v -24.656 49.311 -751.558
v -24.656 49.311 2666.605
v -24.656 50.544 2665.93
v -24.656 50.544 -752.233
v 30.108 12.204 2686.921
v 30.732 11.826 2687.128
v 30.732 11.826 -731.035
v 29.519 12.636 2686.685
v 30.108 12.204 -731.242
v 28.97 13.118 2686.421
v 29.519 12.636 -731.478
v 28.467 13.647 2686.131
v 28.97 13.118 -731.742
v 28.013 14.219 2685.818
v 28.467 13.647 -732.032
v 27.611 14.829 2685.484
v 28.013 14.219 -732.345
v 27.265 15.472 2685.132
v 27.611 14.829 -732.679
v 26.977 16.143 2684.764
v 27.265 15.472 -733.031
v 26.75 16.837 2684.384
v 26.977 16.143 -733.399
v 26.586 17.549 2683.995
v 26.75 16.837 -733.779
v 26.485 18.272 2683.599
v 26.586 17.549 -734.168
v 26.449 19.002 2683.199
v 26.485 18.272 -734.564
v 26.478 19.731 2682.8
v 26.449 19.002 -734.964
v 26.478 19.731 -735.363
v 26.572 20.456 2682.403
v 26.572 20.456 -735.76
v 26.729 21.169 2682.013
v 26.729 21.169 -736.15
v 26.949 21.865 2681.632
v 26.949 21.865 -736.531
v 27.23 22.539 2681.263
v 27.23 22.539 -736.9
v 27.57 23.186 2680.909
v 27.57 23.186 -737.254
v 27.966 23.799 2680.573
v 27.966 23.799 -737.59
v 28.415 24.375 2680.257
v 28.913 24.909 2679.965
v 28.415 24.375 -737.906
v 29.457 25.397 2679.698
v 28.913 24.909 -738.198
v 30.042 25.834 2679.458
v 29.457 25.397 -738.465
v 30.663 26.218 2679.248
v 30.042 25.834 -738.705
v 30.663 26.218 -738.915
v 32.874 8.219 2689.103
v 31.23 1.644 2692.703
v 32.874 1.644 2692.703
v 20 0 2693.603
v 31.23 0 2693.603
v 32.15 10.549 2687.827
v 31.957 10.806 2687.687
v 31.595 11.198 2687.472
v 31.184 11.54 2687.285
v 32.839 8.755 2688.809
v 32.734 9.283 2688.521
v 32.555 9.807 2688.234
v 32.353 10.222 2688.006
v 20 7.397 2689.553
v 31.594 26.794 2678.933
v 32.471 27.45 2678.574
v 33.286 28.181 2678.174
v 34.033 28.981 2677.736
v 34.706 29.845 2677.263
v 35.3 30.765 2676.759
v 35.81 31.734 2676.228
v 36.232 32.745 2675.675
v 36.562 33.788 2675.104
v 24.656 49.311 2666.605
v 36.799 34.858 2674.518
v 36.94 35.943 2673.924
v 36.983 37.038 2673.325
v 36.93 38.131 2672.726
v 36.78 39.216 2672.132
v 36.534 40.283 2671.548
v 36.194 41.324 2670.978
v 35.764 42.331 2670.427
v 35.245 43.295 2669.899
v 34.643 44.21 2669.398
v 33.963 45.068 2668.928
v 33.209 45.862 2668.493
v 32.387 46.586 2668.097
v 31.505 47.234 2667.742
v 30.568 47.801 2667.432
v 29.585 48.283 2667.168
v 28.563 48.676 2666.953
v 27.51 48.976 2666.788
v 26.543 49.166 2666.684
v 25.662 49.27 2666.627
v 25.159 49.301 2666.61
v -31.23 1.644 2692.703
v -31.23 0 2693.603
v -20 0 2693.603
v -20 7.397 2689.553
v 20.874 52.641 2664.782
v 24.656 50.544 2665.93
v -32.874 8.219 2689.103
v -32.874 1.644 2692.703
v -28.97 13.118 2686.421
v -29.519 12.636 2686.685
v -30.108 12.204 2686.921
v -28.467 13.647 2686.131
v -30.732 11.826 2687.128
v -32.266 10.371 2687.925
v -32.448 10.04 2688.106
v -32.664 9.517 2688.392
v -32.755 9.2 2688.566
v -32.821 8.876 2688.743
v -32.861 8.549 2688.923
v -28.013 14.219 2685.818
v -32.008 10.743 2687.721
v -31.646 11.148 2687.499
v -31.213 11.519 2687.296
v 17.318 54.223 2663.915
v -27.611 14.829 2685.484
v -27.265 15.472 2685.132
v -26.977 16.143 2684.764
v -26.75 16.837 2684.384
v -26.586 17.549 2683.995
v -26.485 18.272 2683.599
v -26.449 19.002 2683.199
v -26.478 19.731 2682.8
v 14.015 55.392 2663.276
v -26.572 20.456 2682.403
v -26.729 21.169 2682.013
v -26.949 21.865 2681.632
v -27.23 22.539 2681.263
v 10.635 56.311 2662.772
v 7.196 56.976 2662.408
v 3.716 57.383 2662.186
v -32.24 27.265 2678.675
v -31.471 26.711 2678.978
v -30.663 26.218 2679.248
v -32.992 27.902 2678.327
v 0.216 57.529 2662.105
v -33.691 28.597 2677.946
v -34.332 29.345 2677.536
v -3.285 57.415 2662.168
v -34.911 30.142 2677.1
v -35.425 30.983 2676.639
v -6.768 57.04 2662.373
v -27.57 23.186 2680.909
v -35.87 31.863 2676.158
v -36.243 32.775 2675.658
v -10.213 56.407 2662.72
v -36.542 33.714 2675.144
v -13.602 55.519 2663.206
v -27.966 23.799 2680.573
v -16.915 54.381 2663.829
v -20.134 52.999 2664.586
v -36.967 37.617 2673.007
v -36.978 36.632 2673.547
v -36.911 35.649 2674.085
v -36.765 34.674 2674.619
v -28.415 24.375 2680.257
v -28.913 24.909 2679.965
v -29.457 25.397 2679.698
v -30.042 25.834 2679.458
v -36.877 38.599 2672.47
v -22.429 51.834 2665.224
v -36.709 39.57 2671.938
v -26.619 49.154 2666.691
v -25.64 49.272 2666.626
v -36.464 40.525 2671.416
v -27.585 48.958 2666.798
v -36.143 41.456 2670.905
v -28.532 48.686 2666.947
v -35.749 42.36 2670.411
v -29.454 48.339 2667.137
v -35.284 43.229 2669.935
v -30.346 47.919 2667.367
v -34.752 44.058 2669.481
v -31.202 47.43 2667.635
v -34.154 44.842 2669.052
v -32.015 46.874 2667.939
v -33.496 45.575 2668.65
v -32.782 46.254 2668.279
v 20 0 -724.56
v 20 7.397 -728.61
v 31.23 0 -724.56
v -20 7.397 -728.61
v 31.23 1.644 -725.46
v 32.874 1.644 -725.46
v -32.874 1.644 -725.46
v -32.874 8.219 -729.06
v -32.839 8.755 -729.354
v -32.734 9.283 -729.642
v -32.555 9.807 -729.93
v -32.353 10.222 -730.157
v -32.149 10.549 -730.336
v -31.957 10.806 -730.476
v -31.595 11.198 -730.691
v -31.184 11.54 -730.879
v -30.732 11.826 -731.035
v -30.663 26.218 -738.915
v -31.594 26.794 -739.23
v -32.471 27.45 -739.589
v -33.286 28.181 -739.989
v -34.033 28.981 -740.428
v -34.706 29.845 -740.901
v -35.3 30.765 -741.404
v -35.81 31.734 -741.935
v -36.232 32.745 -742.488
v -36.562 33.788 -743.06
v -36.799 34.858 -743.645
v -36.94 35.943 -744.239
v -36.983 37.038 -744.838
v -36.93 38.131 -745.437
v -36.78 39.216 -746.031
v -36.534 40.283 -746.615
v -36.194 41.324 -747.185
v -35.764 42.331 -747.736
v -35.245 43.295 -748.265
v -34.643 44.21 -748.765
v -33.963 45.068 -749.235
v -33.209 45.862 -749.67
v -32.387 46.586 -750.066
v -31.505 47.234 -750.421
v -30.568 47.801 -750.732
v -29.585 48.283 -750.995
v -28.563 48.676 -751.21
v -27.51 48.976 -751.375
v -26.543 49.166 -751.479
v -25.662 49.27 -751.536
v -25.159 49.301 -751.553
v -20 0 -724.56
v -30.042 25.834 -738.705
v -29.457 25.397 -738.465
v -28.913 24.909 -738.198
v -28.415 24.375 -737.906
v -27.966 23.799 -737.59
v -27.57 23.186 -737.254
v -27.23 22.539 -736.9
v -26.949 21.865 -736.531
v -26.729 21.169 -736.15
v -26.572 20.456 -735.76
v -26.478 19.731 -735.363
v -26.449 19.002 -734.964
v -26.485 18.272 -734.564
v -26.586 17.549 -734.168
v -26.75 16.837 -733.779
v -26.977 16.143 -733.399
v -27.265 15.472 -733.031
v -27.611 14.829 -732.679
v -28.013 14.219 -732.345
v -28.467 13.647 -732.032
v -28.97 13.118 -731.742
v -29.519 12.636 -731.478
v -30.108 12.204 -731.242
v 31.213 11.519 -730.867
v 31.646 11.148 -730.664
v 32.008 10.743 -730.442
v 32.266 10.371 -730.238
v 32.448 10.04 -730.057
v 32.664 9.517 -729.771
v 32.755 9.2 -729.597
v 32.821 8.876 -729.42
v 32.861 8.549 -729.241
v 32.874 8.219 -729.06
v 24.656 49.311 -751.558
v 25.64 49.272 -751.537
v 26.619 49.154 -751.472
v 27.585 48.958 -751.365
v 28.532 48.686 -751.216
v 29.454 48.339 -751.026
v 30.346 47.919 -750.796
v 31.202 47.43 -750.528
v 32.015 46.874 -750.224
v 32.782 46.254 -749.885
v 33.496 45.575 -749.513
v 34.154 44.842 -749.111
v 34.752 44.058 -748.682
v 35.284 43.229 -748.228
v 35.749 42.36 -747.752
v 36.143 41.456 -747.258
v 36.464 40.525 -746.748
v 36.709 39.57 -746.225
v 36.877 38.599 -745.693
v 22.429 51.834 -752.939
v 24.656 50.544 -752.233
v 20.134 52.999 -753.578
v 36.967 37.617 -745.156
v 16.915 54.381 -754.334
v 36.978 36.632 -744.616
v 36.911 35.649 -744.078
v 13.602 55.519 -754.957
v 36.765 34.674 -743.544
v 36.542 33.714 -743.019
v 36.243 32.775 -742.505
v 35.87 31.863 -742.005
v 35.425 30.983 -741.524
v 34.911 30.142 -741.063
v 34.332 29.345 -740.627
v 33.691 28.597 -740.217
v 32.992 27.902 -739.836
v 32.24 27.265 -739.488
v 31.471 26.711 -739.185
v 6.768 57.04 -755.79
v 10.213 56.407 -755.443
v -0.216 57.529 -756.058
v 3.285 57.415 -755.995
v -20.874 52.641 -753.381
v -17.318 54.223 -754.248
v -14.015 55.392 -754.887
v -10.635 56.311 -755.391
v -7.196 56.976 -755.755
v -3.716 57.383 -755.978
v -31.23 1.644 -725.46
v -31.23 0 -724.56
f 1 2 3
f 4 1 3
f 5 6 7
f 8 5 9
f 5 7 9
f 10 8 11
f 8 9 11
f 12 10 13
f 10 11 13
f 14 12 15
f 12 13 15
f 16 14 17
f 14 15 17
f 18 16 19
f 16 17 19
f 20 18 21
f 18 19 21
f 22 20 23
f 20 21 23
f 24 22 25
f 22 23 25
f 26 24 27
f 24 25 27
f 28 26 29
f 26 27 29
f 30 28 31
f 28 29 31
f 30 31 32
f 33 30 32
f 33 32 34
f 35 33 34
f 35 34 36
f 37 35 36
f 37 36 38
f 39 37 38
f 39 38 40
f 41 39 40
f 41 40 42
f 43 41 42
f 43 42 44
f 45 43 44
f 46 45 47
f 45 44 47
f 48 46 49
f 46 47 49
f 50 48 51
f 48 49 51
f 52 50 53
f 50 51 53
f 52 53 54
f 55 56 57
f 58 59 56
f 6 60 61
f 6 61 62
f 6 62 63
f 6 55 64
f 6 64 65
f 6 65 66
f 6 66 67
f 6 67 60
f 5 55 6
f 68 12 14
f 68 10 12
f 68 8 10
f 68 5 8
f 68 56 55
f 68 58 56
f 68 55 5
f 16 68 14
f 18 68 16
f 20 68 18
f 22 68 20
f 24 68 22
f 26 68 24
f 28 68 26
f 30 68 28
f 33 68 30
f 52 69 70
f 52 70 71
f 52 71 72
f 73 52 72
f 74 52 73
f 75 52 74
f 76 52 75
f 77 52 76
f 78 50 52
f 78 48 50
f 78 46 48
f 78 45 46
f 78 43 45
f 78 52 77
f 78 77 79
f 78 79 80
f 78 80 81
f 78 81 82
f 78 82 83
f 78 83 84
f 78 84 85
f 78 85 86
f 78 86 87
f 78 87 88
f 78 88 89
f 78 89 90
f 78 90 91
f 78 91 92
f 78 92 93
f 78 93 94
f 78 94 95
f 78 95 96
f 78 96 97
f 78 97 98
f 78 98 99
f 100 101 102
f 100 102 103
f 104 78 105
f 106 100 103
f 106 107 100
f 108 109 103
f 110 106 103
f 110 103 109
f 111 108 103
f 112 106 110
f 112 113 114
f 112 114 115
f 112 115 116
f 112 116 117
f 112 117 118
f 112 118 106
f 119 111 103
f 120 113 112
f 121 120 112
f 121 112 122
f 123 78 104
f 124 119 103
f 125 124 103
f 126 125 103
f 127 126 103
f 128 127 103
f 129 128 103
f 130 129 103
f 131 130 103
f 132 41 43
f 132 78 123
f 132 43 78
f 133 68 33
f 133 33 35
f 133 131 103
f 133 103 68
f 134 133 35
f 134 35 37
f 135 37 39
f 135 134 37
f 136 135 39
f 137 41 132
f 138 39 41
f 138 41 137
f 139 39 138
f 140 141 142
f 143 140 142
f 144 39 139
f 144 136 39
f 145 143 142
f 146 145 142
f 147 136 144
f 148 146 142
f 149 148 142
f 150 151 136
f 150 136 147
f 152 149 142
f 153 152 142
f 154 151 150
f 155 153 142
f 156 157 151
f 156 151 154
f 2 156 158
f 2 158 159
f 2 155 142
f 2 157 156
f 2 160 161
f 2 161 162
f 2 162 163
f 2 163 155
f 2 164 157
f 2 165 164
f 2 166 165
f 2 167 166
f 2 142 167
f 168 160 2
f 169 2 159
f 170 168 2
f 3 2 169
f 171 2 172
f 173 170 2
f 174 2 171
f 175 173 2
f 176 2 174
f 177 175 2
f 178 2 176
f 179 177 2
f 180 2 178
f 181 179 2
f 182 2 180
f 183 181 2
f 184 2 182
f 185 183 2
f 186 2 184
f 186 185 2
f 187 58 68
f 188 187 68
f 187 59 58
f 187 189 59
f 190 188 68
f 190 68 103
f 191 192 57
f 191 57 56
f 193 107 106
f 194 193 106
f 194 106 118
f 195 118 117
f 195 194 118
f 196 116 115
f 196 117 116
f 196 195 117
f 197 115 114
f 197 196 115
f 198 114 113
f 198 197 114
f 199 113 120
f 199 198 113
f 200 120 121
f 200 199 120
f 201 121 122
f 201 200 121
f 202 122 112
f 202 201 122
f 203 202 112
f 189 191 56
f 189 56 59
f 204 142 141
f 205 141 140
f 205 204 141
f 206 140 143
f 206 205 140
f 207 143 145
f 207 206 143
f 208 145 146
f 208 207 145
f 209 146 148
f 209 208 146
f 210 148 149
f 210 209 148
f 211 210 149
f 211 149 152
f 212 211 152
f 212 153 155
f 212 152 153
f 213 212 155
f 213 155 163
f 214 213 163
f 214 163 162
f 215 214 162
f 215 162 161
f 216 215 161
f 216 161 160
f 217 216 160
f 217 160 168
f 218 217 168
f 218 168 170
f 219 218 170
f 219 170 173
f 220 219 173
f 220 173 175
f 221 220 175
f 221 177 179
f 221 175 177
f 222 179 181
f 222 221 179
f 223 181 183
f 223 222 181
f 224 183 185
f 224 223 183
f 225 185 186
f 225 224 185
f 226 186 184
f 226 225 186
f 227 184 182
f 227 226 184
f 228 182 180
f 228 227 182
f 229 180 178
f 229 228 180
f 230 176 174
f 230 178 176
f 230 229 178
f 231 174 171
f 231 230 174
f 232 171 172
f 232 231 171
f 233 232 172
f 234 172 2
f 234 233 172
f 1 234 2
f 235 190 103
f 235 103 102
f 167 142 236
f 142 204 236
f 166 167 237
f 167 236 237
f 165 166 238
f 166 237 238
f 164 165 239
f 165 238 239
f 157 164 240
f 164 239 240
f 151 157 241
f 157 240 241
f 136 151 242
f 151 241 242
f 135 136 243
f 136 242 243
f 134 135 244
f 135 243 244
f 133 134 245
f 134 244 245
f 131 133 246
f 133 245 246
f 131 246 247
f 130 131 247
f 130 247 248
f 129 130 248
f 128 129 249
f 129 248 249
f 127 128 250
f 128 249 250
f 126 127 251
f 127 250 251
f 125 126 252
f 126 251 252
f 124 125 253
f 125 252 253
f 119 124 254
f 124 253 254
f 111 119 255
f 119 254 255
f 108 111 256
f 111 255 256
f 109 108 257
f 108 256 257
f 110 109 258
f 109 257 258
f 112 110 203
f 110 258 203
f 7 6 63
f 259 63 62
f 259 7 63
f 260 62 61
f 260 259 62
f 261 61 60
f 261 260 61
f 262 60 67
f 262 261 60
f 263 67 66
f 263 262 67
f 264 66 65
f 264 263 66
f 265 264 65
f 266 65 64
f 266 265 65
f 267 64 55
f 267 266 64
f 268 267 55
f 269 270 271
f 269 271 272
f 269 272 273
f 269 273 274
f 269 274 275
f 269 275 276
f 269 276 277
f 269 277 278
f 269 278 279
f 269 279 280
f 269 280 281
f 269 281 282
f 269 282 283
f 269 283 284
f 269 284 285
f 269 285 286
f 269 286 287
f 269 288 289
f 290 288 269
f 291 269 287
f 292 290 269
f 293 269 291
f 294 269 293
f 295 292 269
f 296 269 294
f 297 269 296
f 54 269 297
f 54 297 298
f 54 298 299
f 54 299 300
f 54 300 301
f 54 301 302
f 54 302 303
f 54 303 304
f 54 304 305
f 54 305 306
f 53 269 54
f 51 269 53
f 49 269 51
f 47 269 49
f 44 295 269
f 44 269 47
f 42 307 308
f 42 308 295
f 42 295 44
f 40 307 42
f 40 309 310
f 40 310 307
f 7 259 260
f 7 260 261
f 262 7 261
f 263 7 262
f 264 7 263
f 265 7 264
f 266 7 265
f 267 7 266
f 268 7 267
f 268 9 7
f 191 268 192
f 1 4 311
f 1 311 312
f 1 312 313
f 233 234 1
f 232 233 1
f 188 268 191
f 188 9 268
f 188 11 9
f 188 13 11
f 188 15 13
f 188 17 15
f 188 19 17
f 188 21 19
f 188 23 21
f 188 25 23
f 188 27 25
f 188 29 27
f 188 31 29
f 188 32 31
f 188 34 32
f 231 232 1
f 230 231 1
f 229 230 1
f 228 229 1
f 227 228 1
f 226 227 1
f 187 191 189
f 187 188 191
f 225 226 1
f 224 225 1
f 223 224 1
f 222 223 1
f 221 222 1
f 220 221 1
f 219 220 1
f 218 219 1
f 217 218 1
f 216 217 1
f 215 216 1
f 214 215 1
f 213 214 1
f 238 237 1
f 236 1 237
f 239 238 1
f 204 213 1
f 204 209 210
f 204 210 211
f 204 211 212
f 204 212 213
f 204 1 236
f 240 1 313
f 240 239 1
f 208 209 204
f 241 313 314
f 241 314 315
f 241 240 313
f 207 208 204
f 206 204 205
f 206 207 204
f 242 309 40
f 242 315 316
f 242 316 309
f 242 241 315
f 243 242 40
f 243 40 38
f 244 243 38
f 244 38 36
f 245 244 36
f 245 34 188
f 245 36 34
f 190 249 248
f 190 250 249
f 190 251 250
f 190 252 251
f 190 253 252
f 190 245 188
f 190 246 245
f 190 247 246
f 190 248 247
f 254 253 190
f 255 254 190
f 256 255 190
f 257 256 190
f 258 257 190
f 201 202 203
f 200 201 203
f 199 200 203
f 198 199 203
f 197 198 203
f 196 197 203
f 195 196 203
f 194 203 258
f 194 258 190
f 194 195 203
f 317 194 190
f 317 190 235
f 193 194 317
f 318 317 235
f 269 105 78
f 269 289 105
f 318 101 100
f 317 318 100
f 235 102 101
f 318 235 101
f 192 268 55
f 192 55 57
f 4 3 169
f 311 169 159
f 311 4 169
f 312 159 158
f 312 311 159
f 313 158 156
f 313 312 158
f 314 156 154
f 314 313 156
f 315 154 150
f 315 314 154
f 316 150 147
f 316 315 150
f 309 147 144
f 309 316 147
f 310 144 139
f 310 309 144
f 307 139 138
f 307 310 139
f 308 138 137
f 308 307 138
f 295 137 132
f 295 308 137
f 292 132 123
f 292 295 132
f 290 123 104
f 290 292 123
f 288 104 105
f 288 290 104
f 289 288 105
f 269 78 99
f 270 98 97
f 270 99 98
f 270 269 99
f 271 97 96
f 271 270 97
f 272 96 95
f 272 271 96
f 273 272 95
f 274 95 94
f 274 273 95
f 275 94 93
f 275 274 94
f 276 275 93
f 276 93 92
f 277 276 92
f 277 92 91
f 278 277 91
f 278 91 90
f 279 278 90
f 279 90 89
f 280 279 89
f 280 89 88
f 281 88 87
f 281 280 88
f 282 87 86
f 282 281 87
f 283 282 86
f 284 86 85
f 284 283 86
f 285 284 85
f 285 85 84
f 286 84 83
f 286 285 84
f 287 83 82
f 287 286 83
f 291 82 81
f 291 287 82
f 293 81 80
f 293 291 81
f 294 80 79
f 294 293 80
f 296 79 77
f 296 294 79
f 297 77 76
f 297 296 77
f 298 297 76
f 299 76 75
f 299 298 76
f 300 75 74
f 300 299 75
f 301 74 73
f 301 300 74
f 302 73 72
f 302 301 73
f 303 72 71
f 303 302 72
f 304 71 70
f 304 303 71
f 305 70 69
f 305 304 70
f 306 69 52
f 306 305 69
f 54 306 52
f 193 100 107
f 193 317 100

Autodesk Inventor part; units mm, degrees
sketch "Поручень" plane through (0, 0, 0) normal (0, 0, 1) x (1, 0, 0)
  line L0 (20.3655, -7.6059) -> (20.3655, -0.2092)
  line L1 (20.3655, -0.2092) -> (-19.6345, -0.2092)
  line L2 (-19.6345, -0.2092) -> (-19.6345, -7.6059)
  line L3 (-19.6345, -7.6059) -> (-30.865, -7.6059)
  line L4 (-30.865, -7.6059) -> (-30.865, -5.9622)
  line L5 (-30.865, -5.9622) -> (-32.5087, -5.9622)
  line L6 (-32.5087, -5.9622) -> (-32.5087, 0.6126)
  arc A0 (-30.367, 4.2203) -> (-32.5087, 0.6126) centre (-28.3995, 0.6126) ccw
  arc A1 (-30.367, 4.2203) -> (-30.2973, 18.6123) centre (-34.302, 11.4355) ccw
  arc A2 (-24.2902, 41.7054) -> (-30.2973, 18.6123) centre (-24.2902, 29.3776) ccw
  line L7 (-24.2902, 41.7054) -> (-24.2902, 42.9382)
  arc A3 (25.0211, 42.9382) -> (-24.2902, 42.9382) centre (0.3655, 2.9211) ccw
  line L8 (25.0211, 42.9382) -> (25.0211, 41.7054)
  arc A4 (31.0282, 18.6123) -> (25.0211, 41.7054) centre (25.0211, 29.3776) ccw
  arc A5 (31.0282, 18.6123) -> (31.0979, 4.2203) centre (35.033, 11.4355) ccw
  arc A6 (33.2397, 0.6126) -> (31.0979, 4.2203) centre (29.1304, 0.6126) ccw
  line L9 (33.2397, 0.6126) -> (33.2397, -5.9622)
  line L10 (33.2397, -5.9622) -> (31.596, -5.9622)
  line L11 (31.596, -5.9622) -> (31.596, -7.6059)
  line L12 (31.596, -7.6059) -> (20.3655, -7.6059)
  point P0 (0.3655, -0.2092)
  point P1 (0.3655, -7.6059)
sketch "Эскиз" plane through (0, 0, 0) normal (0, 0, 1) x (1, 0, 0)
  line L0 (20, 0) -> (20, 7.3967)
  line L1 (20, 7.3967) -> (-20, 7.3967)
  line L2 (-20, 7.3967) -> (-20, 0)
  line L3 (-20, 0) -> (-31.2305, 0)
  line L4 (-31.2305, 0) -> (-31.2305, 1.6437)
  line L5 (-31.2305, 1.6437) -> (-32.8742, 1.6437)
  line L6 (-32.8742, 1.6437) -> (-32.8742, 8.2186)
  arc A0 (-30.7325, 11.8262) -> (-32.8742, 8.2186) centre (-28.7649, 8.2186) ccw
  arc A1 (-30.7325, 11.8262) -> (-30.6628, 26.2183) centre (-34.6675, 19.0415) ccw
  arc A2 (-24.6557, 49.3113) -> (-30.6628, 26.2183) centre (-24.6557, 36.9835) ccw
  line L7 (-24.6557, 49.3113) -> (-24.6557, 50.5441)
  arc A3 (24.6557, 50.5441) -> (-24.6557, 50.5441) centre (0, 10.527) ccw
  line L8 (24.6557, 50.5441) -> (24.6557, 49.3113)
  arc A4 (30.6628, 26.2183) -> (24.6557, 49.3113) centre (24.6557, 36.9835) ccw
  arc A5 (30.6628, 26.2183) -> (30.7325, 11.8262) centre (34.6675, 19.0415) ccw
  arc A6 (32.8742, 8.2186) -> (30.7325, 11.8262) centre (28.7649, 8.2186) ccw
  line L9 (32.8742, 8.2186) -> (32.8742, 1.6437)
  line L10 (32.8742, 1.6437) -> (31.2305, 1.6437)
  line L11 (31.2305, 1.6437) -> (31.2305, 0)
  line L12 (31.2305, 0) -> (20, 0)
  point P0 (0, 0)
ref_plane "Начальная плоскость" through (0, 0, -756.0582) normal (0, 0, 1) x (1, 0, 0)
ref_plane "РабПлоскость2" through (0, 0, 1691.8665) normal (0, 0, 1) x (1, 0, 0)
extrude "Тело" add sketch "Эскиз" along normal up to surface (3449.6612 mm away) from surface at -756.0582
ref_plane "Конечная плоскость" through (0, 0, 2693.603) normal (0, 0, 1) x (1, 0, 0)
ref_plane "РабПлоскость4" through (128.3639, -658.2736, 3054.0122) normal (0, 0.4802388, 0.8771378) x (1, 0, 0)
split "Разделение1" plane through (128.3639, -658.2736, 3054.0122) removes the side toward (0, 0.4802388, 0.8771378)
ref_plane "РабПлоскость5" through (-45, -656.9733, -364.8629) normal (0, -0.4802388, -0.8771378) x (1, 0, 0)
split "Разделение2" plane through (-45, -656.9733, -364.8629) removes the side toward (0, -0.4802388, -0.8771378)
equation "\"ШИРИНА\" = 75"
equation "\"ТОЛЩВЫС\" = 58"
equation "\"d0\" = -G_OFFSET_START"
equation "\"СЕЧЕНИЕ_СМЕЩ\" = 0"
equation "\"G_OFFSET_END\" = 1001.73648"
equation "\"d4\" = ДЛИНА + G_OFFSET_END"
equation "\"G_OFFSET_START\" = 756.05818"
equation "\"G_L\" = ДЛИНА + G_OFFSET_START + G_OFFSET_END"
equation "\"ДЛИНА\" = 1691.866499"
properties part number "Поручень" material "Древесина (дуб)"
